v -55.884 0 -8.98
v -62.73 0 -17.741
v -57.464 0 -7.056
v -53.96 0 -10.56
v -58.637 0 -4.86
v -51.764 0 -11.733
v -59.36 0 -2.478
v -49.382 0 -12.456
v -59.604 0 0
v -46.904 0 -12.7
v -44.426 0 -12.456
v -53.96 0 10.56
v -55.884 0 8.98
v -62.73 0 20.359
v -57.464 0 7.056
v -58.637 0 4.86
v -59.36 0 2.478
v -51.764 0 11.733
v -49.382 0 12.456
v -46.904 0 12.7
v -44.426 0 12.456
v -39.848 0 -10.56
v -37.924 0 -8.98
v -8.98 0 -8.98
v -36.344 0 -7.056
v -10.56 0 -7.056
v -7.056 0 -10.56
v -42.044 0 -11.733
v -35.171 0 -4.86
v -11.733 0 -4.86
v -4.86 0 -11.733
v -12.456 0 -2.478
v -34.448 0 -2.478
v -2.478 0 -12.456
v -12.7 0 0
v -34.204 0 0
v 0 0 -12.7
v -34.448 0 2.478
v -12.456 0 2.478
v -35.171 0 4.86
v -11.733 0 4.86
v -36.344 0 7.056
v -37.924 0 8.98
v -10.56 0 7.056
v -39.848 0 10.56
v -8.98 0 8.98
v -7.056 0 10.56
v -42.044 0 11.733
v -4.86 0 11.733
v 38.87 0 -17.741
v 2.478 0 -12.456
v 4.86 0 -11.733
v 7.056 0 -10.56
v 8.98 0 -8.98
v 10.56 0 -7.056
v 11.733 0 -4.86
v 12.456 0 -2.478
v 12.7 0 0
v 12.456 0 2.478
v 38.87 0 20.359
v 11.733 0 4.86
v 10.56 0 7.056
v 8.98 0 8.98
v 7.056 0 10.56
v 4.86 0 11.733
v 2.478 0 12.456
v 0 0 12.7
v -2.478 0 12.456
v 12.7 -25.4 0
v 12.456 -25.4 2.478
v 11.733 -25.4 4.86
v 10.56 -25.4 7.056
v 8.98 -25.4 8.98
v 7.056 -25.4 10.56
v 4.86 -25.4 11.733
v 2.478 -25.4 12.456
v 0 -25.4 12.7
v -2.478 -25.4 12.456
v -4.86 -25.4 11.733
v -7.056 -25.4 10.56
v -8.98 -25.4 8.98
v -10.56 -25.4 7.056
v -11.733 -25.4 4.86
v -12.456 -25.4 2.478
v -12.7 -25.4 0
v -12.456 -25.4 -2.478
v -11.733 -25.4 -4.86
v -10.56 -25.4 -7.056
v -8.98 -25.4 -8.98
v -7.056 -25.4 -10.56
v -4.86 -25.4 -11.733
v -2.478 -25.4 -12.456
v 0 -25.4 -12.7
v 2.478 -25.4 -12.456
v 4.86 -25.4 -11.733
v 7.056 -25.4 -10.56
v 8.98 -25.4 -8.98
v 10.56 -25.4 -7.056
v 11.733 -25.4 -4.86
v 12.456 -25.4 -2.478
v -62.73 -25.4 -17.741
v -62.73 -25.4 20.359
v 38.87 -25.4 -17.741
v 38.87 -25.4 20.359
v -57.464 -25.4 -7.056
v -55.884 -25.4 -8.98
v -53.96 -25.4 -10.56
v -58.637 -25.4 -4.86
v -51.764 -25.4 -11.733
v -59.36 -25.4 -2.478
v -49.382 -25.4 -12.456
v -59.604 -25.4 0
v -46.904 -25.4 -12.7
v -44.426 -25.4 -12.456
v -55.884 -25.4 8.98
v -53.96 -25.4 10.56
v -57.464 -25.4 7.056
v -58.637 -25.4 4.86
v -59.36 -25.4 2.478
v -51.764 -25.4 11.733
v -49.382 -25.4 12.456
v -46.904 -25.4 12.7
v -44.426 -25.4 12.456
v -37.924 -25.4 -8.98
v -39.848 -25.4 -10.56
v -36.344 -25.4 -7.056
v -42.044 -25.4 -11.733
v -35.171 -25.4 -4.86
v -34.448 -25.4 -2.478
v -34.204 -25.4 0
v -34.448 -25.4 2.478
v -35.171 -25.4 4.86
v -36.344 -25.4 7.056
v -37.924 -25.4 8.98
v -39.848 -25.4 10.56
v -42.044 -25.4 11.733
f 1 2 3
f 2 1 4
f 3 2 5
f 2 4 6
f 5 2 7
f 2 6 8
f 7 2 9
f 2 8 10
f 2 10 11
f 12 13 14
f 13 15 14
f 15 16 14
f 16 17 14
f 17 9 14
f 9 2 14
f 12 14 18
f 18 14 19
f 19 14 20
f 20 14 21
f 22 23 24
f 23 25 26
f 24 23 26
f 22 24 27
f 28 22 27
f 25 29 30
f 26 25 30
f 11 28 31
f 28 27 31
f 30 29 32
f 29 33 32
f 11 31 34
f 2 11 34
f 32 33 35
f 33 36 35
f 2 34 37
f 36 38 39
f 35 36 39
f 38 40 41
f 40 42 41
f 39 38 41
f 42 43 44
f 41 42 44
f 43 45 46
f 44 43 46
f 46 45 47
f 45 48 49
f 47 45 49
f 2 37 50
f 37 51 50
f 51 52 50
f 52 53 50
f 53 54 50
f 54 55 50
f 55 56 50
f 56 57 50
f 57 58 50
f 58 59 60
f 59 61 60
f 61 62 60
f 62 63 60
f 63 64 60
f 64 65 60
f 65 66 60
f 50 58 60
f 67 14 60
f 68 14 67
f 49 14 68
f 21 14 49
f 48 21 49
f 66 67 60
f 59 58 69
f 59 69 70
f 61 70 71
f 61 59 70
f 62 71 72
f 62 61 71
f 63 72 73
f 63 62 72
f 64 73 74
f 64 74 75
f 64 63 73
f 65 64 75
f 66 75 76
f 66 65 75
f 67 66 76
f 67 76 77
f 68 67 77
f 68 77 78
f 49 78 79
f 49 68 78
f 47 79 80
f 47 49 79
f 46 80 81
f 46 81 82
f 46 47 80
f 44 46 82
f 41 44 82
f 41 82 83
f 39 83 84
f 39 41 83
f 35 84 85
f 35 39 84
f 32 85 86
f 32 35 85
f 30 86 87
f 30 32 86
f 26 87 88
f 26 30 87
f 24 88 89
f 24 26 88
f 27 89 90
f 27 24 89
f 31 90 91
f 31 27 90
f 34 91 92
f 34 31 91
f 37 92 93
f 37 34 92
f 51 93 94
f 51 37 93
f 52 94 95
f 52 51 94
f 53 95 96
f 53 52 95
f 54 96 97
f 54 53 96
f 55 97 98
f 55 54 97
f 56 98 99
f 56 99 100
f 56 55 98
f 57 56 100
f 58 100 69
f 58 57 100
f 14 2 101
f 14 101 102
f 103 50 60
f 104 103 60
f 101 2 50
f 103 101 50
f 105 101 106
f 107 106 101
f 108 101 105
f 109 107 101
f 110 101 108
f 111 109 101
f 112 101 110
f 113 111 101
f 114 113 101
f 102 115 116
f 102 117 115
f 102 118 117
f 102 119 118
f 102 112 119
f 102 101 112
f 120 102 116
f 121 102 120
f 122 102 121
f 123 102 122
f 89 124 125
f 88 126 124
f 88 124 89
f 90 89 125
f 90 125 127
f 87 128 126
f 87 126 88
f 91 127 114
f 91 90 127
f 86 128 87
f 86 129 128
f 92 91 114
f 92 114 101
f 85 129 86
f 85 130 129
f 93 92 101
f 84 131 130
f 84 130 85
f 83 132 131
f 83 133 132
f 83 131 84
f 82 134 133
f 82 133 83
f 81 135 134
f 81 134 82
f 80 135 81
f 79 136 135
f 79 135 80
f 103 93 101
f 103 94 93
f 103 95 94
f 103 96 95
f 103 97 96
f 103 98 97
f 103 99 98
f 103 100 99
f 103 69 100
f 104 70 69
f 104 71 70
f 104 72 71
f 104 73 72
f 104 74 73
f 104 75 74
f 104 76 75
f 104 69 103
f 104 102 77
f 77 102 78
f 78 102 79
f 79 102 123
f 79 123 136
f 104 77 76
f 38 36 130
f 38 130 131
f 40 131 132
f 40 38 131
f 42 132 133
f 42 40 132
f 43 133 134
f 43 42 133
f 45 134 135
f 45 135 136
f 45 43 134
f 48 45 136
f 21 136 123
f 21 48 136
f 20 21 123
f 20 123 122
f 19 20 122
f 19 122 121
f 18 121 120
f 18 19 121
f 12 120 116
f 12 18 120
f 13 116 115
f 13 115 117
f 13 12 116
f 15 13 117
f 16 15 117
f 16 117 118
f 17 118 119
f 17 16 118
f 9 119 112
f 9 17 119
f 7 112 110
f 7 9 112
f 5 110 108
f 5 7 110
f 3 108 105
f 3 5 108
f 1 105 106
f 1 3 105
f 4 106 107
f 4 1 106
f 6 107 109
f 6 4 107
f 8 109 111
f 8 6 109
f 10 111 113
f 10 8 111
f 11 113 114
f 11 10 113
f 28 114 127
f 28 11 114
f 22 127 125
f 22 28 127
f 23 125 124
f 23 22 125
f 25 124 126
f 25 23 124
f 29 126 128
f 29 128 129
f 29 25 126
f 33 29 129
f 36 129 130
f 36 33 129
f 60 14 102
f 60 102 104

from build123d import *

# Parameters (mm, degrees)
F0_W     = 101.6
F0_H     = 38.1
F0_R     = 12.7
F1_DEPTH = 25.4


with BuildPart() as f1:
    # F0 (on Front) → F1 (new body)
    with BuildSketch(Plane.XZ):
        with Locations((-11.930157, 1.308589)):
            Rectangle(F0_W, F0_H)
        with Locations((-46.90408, 0)):
            Circle(F0_R, mode=Mode.SUBTRACT)
        Circle(F0_R, mode=Mode.SUBTRACT)
    extrude(amount=F1_DEPTH)


solid = f1.part
